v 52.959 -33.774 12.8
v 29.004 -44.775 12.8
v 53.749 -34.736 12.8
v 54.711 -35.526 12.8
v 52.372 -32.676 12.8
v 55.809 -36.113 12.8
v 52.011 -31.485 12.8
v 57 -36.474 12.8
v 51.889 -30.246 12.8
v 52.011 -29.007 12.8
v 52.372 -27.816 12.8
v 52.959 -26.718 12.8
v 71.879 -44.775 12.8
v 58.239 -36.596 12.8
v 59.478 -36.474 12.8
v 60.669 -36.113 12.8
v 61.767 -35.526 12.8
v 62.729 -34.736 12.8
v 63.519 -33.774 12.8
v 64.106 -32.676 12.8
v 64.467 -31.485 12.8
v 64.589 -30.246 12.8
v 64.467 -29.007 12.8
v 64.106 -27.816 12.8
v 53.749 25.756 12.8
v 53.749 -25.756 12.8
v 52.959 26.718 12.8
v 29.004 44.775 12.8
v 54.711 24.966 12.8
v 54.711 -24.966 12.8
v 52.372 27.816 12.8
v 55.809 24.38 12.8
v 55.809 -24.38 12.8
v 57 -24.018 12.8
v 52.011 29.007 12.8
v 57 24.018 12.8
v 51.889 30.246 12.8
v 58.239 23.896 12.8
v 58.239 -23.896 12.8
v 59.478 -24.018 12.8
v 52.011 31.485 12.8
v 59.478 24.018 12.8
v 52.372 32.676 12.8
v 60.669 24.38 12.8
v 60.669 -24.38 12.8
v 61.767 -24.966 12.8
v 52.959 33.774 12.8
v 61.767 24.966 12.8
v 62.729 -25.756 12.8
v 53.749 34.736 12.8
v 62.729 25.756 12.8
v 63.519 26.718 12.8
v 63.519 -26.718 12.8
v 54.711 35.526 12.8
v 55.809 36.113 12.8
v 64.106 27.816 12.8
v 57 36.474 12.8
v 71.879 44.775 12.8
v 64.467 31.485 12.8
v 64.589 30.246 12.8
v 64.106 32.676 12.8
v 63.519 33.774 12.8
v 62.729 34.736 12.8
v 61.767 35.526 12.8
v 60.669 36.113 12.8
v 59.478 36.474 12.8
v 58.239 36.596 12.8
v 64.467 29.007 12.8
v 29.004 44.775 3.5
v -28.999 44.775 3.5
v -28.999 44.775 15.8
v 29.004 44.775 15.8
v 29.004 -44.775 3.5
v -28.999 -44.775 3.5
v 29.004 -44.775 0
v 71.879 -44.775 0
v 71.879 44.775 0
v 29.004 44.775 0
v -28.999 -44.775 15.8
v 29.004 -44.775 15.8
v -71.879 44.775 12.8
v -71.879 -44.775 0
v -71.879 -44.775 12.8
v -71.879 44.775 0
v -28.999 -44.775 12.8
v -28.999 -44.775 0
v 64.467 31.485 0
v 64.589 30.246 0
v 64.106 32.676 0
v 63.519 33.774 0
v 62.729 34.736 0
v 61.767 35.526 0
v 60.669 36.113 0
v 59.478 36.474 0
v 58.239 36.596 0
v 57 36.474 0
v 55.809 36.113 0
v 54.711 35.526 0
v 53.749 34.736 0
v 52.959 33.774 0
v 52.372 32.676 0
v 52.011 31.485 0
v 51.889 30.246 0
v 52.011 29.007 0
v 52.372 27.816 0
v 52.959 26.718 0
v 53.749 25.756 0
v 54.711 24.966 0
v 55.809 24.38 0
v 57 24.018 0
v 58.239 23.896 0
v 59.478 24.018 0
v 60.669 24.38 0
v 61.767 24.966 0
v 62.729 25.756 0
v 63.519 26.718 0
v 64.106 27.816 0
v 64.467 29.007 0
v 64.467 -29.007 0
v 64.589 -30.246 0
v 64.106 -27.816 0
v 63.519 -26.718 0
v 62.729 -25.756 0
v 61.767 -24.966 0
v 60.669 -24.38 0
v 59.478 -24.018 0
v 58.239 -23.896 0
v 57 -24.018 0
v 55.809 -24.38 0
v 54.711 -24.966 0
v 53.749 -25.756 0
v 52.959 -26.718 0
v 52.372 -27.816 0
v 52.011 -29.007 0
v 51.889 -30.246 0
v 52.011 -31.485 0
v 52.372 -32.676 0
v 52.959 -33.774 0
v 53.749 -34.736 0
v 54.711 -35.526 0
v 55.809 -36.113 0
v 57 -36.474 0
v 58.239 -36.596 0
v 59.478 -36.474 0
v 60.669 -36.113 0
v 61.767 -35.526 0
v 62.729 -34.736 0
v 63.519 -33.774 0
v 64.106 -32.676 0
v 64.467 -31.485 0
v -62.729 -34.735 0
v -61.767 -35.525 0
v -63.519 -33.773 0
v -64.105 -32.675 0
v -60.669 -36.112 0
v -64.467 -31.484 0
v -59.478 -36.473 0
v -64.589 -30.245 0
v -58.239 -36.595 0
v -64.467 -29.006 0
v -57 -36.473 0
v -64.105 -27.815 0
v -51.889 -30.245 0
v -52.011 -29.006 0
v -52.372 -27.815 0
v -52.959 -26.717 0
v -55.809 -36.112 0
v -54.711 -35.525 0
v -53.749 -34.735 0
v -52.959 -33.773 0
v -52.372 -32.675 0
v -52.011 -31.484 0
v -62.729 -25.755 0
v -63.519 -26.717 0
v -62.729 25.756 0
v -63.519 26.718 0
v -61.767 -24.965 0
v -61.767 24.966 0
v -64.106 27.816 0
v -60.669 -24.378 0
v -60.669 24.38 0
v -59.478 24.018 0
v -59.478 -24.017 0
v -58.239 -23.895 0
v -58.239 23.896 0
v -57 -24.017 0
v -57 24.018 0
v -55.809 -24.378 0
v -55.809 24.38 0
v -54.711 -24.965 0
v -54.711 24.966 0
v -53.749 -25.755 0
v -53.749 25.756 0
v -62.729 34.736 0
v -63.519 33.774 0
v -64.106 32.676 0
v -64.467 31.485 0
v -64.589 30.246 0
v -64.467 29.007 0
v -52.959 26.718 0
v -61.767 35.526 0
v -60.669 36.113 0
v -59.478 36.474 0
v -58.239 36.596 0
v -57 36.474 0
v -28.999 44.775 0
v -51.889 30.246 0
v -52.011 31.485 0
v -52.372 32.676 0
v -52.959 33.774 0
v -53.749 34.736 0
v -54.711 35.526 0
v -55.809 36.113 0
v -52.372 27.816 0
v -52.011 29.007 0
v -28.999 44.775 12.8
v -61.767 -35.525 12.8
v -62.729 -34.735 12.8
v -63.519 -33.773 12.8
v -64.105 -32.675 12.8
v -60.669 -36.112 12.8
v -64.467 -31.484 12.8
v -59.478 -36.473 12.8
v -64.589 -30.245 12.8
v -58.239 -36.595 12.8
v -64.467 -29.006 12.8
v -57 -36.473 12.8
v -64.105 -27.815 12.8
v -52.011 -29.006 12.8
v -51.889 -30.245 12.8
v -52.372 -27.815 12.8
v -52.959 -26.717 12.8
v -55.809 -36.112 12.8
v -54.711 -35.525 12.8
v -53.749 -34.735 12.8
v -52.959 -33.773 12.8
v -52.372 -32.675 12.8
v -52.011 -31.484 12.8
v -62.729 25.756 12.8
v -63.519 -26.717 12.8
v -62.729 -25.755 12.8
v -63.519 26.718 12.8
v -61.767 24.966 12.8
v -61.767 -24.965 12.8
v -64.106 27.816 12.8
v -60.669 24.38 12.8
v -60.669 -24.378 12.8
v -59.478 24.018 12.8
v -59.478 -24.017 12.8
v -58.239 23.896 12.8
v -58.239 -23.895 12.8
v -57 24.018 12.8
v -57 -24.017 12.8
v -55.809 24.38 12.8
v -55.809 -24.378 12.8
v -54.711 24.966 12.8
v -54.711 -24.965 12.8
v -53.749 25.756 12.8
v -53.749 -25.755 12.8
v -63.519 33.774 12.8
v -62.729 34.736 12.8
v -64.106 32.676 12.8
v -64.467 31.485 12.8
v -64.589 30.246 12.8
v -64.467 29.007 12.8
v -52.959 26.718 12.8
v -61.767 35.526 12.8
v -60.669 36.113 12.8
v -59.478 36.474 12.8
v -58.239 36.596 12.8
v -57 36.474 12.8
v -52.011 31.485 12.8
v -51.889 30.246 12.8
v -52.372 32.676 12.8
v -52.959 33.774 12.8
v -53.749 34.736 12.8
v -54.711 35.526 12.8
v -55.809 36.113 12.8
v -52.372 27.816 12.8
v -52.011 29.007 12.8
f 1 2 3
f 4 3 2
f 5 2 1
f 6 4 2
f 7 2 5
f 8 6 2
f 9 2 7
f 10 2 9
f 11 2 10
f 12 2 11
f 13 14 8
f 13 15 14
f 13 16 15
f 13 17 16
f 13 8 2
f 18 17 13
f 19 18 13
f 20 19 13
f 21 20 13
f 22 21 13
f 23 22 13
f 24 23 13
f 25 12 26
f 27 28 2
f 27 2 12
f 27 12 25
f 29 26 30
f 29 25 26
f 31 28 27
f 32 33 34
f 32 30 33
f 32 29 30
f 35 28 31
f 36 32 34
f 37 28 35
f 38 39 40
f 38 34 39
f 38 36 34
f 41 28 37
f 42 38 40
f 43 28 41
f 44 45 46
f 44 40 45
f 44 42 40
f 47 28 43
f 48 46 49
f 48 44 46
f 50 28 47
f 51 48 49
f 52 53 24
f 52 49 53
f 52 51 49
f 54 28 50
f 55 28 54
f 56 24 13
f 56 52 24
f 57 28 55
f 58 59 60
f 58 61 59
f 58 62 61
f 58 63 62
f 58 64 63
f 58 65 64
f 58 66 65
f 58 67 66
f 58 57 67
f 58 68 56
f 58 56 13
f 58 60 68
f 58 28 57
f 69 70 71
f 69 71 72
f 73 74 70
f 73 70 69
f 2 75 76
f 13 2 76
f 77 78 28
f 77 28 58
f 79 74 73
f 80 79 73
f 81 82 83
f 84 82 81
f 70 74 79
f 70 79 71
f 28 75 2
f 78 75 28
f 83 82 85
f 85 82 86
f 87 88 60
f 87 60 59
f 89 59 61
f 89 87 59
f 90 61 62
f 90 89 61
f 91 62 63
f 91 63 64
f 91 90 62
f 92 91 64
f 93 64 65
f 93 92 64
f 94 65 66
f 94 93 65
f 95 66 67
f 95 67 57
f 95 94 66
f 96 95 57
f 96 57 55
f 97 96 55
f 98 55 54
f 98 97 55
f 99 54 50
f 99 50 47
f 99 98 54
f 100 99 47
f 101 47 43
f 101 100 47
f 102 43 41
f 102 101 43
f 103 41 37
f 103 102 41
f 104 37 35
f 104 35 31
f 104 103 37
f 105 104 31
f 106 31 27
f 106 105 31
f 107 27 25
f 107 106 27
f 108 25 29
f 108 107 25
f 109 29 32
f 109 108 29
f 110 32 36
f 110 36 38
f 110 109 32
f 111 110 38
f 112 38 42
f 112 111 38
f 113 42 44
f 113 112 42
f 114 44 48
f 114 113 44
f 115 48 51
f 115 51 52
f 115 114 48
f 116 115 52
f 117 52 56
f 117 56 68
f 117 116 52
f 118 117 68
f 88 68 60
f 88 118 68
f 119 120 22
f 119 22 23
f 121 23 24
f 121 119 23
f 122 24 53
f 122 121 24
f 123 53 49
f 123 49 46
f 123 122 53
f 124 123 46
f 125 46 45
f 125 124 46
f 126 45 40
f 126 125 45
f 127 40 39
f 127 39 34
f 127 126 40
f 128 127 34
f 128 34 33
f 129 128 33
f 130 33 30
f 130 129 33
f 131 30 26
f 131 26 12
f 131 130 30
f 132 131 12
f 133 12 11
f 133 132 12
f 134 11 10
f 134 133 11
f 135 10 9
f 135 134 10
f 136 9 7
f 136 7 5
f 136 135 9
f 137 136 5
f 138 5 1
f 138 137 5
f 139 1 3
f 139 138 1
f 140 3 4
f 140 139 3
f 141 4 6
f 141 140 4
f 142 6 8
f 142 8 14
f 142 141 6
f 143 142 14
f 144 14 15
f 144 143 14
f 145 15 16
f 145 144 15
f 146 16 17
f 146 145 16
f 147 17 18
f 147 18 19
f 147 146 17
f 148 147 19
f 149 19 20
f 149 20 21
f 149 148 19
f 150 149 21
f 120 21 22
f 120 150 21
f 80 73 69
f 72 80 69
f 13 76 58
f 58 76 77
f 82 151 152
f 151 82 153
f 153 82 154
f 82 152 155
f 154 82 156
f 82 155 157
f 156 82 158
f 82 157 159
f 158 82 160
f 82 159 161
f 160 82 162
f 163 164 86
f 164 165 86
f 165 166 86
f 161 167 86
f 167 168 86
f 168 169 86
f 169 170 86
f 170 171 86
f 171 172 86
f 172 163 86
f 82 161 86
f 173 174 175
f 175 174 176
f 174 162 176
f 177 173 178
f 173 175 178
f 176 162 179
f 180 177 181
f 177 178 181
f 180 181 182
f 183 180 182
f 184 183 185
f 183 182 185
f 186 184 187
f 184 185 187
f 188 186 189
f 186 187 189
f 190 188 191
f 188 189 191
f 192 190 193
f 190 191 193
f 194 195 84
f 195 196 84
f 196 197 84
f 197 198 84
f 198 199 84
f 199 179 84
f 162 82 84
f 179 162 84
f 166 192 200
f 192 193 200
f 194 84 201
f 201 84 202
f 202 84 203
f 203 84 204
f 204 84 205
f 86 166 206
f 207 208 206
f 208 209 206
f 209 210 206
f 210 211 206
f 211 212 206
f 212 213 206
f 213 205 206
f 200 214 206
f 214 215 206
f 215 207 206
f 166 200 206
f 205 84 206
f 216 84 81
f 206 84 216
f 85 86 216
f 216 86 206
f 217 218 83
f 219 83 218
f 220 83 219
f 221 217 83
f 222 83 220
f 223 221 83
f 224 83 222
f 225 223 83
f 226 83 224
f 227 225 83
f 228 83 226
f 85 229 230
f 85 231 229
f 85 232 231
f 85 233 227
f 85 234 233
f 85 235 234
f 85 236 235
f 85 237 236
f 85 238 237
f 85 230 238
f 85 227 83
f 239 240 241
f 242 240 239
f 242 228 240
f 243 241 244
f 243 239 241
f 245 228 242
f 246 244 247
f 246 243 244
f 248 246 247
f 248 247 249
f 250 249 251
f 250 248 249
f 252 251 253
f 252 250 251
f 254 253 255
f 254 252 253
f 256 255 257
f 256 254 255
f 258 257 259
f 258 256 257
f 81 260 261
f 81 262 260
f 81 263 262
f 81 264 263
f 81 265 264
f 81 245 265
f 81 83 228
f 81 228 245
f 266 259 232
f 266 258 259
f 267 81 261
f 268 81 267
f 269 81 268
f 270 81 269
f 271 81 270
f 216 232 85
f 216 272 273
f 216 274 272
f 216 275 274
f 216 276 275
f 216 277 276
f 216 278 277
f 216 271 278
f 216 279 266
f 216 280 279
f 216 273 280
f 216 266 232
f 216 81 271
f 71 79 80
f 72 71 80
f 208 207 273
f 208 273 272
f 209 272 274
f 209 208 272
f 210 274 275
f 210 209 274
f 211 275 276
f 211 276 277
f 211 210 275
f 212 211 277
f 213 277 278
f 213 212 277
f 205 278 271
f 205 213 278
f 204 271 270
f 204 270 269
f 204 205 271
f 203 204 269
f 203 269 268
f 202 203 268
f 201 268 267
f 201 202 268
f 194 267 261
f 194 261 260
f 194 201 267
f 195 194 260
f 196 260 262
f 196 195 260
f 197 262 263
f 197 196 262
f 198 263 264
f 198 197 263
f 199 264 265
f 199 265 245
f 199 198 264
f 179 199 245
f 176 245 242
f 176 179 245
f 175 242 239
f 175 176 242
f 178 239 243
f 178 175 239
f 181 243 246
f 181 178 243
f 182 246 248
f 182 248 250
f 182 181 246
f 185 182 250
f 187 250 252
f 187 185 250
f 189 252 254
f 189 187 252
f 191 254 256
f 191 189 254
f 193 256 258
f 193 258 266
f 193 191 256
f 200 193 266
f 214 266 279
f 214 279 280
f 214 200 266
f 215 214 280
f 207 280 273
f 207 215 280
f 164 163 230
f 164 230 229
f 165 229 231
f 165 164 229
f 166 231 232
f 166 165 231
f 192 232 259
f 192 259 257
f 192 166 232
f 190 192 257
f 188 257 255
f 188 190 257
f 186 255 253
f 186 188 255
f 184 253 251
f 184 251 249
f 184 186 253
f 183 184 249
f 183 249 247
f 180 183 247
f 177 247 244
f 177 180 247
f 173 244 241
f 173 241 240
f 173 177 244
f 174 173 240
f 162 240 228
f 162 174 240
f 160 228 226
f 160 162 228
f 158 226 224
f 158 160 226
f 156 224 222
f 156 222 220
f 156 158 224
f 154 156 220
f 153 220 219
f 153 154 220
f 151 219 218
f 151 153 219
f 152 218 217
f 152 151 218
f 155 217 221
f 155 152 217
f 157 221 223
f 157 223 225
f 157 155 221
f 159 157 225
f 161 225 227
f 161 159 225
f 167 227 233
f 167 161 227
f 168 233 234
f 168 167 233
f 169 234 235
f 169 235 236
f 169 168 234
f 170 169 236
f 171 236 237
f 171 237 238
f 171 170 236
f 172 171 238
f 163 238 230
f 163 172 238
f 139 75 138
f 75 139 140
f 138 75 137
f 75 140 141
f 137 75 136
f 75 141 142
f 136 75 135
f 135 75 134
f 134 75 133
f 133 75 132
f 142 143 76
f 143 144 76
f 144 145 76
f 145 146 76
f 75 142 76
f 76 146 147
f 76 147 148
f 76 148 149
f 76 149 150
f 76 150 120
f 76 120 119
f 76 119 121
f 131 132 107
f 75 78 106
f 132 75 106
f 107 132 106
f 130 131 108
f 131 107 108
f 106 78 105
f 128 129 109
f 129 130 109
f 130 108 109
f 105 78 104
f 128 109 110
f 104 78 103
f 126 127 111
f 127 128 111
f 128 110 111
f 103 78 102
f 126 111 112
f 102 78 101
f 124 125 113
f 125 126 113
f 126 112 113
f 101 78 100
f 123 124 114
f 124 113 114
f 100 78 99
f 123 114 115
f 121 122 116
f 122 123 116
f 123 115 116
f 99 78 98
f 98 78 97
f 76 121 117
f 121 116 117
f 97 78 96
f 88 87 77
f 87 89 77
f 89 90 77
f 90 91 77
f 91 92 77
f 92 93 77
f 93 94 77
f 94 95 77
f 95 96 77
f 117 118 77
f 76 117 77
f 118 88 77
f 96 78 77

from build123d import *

# Parameters (mm, degrees)
F0_W     = 42.880001
F0_H     = 89.550002
F0_R     = 6.35
F0_W_2   = 42.8752
F1_DEPTH = 12.8
F0_W_3   = 58.002259
F2_DEPTH = 15.799999
F3_DEPTH = 3.499993


with BuildPart() as f1:
    # F0 (on Top) → F1 (new body)
    with BuildSketch(Plane.XY):
        with Locations((-50.438729, 0)):
            Rectangle(F0_W, F0_H)
        with Locations((-58.238729, -30.245002)):
            Circle(F0_R, mode=Mode.SUBTRACT)
        with Locations((-58.23893, 30.246201)):
            Circle(F0_R, mode=Mode.SUBTRACT)
        with Locations((50.44113, 0)):
            Rectangle(F0_W_2, F0_H)
        with Locations((58.23893, -30.246201)):
            Circle(F0_R, mode=Mode.SUBTRACT)
        with Locations((58.23893, 30.246201)):
            Circle(F0_R, mode=Mode.SUBTRACT)
    extrude(amount=F1_DEPTH)


with BuildPart() as f2:
    # F0 (on Top) → F2 (new body)
    with BuildSketch(Plane.XY):
        with Locations((0.002401, 0)):
            Rectangle(F0_W_3, F0_H)
    extrude(amount=F2_DEPTH)

    # F0 (on Top) → F3 (cut)
    with BuildSketch(Plane.XY):
        with Locations((0.002401, 0)):
            Rectangle(F0_W_3, F0_H)
    extrude(amount=F3_DEPTH, mode=Mode.SUBTRACT)


solid = Compound([f1.part, f2.part])
